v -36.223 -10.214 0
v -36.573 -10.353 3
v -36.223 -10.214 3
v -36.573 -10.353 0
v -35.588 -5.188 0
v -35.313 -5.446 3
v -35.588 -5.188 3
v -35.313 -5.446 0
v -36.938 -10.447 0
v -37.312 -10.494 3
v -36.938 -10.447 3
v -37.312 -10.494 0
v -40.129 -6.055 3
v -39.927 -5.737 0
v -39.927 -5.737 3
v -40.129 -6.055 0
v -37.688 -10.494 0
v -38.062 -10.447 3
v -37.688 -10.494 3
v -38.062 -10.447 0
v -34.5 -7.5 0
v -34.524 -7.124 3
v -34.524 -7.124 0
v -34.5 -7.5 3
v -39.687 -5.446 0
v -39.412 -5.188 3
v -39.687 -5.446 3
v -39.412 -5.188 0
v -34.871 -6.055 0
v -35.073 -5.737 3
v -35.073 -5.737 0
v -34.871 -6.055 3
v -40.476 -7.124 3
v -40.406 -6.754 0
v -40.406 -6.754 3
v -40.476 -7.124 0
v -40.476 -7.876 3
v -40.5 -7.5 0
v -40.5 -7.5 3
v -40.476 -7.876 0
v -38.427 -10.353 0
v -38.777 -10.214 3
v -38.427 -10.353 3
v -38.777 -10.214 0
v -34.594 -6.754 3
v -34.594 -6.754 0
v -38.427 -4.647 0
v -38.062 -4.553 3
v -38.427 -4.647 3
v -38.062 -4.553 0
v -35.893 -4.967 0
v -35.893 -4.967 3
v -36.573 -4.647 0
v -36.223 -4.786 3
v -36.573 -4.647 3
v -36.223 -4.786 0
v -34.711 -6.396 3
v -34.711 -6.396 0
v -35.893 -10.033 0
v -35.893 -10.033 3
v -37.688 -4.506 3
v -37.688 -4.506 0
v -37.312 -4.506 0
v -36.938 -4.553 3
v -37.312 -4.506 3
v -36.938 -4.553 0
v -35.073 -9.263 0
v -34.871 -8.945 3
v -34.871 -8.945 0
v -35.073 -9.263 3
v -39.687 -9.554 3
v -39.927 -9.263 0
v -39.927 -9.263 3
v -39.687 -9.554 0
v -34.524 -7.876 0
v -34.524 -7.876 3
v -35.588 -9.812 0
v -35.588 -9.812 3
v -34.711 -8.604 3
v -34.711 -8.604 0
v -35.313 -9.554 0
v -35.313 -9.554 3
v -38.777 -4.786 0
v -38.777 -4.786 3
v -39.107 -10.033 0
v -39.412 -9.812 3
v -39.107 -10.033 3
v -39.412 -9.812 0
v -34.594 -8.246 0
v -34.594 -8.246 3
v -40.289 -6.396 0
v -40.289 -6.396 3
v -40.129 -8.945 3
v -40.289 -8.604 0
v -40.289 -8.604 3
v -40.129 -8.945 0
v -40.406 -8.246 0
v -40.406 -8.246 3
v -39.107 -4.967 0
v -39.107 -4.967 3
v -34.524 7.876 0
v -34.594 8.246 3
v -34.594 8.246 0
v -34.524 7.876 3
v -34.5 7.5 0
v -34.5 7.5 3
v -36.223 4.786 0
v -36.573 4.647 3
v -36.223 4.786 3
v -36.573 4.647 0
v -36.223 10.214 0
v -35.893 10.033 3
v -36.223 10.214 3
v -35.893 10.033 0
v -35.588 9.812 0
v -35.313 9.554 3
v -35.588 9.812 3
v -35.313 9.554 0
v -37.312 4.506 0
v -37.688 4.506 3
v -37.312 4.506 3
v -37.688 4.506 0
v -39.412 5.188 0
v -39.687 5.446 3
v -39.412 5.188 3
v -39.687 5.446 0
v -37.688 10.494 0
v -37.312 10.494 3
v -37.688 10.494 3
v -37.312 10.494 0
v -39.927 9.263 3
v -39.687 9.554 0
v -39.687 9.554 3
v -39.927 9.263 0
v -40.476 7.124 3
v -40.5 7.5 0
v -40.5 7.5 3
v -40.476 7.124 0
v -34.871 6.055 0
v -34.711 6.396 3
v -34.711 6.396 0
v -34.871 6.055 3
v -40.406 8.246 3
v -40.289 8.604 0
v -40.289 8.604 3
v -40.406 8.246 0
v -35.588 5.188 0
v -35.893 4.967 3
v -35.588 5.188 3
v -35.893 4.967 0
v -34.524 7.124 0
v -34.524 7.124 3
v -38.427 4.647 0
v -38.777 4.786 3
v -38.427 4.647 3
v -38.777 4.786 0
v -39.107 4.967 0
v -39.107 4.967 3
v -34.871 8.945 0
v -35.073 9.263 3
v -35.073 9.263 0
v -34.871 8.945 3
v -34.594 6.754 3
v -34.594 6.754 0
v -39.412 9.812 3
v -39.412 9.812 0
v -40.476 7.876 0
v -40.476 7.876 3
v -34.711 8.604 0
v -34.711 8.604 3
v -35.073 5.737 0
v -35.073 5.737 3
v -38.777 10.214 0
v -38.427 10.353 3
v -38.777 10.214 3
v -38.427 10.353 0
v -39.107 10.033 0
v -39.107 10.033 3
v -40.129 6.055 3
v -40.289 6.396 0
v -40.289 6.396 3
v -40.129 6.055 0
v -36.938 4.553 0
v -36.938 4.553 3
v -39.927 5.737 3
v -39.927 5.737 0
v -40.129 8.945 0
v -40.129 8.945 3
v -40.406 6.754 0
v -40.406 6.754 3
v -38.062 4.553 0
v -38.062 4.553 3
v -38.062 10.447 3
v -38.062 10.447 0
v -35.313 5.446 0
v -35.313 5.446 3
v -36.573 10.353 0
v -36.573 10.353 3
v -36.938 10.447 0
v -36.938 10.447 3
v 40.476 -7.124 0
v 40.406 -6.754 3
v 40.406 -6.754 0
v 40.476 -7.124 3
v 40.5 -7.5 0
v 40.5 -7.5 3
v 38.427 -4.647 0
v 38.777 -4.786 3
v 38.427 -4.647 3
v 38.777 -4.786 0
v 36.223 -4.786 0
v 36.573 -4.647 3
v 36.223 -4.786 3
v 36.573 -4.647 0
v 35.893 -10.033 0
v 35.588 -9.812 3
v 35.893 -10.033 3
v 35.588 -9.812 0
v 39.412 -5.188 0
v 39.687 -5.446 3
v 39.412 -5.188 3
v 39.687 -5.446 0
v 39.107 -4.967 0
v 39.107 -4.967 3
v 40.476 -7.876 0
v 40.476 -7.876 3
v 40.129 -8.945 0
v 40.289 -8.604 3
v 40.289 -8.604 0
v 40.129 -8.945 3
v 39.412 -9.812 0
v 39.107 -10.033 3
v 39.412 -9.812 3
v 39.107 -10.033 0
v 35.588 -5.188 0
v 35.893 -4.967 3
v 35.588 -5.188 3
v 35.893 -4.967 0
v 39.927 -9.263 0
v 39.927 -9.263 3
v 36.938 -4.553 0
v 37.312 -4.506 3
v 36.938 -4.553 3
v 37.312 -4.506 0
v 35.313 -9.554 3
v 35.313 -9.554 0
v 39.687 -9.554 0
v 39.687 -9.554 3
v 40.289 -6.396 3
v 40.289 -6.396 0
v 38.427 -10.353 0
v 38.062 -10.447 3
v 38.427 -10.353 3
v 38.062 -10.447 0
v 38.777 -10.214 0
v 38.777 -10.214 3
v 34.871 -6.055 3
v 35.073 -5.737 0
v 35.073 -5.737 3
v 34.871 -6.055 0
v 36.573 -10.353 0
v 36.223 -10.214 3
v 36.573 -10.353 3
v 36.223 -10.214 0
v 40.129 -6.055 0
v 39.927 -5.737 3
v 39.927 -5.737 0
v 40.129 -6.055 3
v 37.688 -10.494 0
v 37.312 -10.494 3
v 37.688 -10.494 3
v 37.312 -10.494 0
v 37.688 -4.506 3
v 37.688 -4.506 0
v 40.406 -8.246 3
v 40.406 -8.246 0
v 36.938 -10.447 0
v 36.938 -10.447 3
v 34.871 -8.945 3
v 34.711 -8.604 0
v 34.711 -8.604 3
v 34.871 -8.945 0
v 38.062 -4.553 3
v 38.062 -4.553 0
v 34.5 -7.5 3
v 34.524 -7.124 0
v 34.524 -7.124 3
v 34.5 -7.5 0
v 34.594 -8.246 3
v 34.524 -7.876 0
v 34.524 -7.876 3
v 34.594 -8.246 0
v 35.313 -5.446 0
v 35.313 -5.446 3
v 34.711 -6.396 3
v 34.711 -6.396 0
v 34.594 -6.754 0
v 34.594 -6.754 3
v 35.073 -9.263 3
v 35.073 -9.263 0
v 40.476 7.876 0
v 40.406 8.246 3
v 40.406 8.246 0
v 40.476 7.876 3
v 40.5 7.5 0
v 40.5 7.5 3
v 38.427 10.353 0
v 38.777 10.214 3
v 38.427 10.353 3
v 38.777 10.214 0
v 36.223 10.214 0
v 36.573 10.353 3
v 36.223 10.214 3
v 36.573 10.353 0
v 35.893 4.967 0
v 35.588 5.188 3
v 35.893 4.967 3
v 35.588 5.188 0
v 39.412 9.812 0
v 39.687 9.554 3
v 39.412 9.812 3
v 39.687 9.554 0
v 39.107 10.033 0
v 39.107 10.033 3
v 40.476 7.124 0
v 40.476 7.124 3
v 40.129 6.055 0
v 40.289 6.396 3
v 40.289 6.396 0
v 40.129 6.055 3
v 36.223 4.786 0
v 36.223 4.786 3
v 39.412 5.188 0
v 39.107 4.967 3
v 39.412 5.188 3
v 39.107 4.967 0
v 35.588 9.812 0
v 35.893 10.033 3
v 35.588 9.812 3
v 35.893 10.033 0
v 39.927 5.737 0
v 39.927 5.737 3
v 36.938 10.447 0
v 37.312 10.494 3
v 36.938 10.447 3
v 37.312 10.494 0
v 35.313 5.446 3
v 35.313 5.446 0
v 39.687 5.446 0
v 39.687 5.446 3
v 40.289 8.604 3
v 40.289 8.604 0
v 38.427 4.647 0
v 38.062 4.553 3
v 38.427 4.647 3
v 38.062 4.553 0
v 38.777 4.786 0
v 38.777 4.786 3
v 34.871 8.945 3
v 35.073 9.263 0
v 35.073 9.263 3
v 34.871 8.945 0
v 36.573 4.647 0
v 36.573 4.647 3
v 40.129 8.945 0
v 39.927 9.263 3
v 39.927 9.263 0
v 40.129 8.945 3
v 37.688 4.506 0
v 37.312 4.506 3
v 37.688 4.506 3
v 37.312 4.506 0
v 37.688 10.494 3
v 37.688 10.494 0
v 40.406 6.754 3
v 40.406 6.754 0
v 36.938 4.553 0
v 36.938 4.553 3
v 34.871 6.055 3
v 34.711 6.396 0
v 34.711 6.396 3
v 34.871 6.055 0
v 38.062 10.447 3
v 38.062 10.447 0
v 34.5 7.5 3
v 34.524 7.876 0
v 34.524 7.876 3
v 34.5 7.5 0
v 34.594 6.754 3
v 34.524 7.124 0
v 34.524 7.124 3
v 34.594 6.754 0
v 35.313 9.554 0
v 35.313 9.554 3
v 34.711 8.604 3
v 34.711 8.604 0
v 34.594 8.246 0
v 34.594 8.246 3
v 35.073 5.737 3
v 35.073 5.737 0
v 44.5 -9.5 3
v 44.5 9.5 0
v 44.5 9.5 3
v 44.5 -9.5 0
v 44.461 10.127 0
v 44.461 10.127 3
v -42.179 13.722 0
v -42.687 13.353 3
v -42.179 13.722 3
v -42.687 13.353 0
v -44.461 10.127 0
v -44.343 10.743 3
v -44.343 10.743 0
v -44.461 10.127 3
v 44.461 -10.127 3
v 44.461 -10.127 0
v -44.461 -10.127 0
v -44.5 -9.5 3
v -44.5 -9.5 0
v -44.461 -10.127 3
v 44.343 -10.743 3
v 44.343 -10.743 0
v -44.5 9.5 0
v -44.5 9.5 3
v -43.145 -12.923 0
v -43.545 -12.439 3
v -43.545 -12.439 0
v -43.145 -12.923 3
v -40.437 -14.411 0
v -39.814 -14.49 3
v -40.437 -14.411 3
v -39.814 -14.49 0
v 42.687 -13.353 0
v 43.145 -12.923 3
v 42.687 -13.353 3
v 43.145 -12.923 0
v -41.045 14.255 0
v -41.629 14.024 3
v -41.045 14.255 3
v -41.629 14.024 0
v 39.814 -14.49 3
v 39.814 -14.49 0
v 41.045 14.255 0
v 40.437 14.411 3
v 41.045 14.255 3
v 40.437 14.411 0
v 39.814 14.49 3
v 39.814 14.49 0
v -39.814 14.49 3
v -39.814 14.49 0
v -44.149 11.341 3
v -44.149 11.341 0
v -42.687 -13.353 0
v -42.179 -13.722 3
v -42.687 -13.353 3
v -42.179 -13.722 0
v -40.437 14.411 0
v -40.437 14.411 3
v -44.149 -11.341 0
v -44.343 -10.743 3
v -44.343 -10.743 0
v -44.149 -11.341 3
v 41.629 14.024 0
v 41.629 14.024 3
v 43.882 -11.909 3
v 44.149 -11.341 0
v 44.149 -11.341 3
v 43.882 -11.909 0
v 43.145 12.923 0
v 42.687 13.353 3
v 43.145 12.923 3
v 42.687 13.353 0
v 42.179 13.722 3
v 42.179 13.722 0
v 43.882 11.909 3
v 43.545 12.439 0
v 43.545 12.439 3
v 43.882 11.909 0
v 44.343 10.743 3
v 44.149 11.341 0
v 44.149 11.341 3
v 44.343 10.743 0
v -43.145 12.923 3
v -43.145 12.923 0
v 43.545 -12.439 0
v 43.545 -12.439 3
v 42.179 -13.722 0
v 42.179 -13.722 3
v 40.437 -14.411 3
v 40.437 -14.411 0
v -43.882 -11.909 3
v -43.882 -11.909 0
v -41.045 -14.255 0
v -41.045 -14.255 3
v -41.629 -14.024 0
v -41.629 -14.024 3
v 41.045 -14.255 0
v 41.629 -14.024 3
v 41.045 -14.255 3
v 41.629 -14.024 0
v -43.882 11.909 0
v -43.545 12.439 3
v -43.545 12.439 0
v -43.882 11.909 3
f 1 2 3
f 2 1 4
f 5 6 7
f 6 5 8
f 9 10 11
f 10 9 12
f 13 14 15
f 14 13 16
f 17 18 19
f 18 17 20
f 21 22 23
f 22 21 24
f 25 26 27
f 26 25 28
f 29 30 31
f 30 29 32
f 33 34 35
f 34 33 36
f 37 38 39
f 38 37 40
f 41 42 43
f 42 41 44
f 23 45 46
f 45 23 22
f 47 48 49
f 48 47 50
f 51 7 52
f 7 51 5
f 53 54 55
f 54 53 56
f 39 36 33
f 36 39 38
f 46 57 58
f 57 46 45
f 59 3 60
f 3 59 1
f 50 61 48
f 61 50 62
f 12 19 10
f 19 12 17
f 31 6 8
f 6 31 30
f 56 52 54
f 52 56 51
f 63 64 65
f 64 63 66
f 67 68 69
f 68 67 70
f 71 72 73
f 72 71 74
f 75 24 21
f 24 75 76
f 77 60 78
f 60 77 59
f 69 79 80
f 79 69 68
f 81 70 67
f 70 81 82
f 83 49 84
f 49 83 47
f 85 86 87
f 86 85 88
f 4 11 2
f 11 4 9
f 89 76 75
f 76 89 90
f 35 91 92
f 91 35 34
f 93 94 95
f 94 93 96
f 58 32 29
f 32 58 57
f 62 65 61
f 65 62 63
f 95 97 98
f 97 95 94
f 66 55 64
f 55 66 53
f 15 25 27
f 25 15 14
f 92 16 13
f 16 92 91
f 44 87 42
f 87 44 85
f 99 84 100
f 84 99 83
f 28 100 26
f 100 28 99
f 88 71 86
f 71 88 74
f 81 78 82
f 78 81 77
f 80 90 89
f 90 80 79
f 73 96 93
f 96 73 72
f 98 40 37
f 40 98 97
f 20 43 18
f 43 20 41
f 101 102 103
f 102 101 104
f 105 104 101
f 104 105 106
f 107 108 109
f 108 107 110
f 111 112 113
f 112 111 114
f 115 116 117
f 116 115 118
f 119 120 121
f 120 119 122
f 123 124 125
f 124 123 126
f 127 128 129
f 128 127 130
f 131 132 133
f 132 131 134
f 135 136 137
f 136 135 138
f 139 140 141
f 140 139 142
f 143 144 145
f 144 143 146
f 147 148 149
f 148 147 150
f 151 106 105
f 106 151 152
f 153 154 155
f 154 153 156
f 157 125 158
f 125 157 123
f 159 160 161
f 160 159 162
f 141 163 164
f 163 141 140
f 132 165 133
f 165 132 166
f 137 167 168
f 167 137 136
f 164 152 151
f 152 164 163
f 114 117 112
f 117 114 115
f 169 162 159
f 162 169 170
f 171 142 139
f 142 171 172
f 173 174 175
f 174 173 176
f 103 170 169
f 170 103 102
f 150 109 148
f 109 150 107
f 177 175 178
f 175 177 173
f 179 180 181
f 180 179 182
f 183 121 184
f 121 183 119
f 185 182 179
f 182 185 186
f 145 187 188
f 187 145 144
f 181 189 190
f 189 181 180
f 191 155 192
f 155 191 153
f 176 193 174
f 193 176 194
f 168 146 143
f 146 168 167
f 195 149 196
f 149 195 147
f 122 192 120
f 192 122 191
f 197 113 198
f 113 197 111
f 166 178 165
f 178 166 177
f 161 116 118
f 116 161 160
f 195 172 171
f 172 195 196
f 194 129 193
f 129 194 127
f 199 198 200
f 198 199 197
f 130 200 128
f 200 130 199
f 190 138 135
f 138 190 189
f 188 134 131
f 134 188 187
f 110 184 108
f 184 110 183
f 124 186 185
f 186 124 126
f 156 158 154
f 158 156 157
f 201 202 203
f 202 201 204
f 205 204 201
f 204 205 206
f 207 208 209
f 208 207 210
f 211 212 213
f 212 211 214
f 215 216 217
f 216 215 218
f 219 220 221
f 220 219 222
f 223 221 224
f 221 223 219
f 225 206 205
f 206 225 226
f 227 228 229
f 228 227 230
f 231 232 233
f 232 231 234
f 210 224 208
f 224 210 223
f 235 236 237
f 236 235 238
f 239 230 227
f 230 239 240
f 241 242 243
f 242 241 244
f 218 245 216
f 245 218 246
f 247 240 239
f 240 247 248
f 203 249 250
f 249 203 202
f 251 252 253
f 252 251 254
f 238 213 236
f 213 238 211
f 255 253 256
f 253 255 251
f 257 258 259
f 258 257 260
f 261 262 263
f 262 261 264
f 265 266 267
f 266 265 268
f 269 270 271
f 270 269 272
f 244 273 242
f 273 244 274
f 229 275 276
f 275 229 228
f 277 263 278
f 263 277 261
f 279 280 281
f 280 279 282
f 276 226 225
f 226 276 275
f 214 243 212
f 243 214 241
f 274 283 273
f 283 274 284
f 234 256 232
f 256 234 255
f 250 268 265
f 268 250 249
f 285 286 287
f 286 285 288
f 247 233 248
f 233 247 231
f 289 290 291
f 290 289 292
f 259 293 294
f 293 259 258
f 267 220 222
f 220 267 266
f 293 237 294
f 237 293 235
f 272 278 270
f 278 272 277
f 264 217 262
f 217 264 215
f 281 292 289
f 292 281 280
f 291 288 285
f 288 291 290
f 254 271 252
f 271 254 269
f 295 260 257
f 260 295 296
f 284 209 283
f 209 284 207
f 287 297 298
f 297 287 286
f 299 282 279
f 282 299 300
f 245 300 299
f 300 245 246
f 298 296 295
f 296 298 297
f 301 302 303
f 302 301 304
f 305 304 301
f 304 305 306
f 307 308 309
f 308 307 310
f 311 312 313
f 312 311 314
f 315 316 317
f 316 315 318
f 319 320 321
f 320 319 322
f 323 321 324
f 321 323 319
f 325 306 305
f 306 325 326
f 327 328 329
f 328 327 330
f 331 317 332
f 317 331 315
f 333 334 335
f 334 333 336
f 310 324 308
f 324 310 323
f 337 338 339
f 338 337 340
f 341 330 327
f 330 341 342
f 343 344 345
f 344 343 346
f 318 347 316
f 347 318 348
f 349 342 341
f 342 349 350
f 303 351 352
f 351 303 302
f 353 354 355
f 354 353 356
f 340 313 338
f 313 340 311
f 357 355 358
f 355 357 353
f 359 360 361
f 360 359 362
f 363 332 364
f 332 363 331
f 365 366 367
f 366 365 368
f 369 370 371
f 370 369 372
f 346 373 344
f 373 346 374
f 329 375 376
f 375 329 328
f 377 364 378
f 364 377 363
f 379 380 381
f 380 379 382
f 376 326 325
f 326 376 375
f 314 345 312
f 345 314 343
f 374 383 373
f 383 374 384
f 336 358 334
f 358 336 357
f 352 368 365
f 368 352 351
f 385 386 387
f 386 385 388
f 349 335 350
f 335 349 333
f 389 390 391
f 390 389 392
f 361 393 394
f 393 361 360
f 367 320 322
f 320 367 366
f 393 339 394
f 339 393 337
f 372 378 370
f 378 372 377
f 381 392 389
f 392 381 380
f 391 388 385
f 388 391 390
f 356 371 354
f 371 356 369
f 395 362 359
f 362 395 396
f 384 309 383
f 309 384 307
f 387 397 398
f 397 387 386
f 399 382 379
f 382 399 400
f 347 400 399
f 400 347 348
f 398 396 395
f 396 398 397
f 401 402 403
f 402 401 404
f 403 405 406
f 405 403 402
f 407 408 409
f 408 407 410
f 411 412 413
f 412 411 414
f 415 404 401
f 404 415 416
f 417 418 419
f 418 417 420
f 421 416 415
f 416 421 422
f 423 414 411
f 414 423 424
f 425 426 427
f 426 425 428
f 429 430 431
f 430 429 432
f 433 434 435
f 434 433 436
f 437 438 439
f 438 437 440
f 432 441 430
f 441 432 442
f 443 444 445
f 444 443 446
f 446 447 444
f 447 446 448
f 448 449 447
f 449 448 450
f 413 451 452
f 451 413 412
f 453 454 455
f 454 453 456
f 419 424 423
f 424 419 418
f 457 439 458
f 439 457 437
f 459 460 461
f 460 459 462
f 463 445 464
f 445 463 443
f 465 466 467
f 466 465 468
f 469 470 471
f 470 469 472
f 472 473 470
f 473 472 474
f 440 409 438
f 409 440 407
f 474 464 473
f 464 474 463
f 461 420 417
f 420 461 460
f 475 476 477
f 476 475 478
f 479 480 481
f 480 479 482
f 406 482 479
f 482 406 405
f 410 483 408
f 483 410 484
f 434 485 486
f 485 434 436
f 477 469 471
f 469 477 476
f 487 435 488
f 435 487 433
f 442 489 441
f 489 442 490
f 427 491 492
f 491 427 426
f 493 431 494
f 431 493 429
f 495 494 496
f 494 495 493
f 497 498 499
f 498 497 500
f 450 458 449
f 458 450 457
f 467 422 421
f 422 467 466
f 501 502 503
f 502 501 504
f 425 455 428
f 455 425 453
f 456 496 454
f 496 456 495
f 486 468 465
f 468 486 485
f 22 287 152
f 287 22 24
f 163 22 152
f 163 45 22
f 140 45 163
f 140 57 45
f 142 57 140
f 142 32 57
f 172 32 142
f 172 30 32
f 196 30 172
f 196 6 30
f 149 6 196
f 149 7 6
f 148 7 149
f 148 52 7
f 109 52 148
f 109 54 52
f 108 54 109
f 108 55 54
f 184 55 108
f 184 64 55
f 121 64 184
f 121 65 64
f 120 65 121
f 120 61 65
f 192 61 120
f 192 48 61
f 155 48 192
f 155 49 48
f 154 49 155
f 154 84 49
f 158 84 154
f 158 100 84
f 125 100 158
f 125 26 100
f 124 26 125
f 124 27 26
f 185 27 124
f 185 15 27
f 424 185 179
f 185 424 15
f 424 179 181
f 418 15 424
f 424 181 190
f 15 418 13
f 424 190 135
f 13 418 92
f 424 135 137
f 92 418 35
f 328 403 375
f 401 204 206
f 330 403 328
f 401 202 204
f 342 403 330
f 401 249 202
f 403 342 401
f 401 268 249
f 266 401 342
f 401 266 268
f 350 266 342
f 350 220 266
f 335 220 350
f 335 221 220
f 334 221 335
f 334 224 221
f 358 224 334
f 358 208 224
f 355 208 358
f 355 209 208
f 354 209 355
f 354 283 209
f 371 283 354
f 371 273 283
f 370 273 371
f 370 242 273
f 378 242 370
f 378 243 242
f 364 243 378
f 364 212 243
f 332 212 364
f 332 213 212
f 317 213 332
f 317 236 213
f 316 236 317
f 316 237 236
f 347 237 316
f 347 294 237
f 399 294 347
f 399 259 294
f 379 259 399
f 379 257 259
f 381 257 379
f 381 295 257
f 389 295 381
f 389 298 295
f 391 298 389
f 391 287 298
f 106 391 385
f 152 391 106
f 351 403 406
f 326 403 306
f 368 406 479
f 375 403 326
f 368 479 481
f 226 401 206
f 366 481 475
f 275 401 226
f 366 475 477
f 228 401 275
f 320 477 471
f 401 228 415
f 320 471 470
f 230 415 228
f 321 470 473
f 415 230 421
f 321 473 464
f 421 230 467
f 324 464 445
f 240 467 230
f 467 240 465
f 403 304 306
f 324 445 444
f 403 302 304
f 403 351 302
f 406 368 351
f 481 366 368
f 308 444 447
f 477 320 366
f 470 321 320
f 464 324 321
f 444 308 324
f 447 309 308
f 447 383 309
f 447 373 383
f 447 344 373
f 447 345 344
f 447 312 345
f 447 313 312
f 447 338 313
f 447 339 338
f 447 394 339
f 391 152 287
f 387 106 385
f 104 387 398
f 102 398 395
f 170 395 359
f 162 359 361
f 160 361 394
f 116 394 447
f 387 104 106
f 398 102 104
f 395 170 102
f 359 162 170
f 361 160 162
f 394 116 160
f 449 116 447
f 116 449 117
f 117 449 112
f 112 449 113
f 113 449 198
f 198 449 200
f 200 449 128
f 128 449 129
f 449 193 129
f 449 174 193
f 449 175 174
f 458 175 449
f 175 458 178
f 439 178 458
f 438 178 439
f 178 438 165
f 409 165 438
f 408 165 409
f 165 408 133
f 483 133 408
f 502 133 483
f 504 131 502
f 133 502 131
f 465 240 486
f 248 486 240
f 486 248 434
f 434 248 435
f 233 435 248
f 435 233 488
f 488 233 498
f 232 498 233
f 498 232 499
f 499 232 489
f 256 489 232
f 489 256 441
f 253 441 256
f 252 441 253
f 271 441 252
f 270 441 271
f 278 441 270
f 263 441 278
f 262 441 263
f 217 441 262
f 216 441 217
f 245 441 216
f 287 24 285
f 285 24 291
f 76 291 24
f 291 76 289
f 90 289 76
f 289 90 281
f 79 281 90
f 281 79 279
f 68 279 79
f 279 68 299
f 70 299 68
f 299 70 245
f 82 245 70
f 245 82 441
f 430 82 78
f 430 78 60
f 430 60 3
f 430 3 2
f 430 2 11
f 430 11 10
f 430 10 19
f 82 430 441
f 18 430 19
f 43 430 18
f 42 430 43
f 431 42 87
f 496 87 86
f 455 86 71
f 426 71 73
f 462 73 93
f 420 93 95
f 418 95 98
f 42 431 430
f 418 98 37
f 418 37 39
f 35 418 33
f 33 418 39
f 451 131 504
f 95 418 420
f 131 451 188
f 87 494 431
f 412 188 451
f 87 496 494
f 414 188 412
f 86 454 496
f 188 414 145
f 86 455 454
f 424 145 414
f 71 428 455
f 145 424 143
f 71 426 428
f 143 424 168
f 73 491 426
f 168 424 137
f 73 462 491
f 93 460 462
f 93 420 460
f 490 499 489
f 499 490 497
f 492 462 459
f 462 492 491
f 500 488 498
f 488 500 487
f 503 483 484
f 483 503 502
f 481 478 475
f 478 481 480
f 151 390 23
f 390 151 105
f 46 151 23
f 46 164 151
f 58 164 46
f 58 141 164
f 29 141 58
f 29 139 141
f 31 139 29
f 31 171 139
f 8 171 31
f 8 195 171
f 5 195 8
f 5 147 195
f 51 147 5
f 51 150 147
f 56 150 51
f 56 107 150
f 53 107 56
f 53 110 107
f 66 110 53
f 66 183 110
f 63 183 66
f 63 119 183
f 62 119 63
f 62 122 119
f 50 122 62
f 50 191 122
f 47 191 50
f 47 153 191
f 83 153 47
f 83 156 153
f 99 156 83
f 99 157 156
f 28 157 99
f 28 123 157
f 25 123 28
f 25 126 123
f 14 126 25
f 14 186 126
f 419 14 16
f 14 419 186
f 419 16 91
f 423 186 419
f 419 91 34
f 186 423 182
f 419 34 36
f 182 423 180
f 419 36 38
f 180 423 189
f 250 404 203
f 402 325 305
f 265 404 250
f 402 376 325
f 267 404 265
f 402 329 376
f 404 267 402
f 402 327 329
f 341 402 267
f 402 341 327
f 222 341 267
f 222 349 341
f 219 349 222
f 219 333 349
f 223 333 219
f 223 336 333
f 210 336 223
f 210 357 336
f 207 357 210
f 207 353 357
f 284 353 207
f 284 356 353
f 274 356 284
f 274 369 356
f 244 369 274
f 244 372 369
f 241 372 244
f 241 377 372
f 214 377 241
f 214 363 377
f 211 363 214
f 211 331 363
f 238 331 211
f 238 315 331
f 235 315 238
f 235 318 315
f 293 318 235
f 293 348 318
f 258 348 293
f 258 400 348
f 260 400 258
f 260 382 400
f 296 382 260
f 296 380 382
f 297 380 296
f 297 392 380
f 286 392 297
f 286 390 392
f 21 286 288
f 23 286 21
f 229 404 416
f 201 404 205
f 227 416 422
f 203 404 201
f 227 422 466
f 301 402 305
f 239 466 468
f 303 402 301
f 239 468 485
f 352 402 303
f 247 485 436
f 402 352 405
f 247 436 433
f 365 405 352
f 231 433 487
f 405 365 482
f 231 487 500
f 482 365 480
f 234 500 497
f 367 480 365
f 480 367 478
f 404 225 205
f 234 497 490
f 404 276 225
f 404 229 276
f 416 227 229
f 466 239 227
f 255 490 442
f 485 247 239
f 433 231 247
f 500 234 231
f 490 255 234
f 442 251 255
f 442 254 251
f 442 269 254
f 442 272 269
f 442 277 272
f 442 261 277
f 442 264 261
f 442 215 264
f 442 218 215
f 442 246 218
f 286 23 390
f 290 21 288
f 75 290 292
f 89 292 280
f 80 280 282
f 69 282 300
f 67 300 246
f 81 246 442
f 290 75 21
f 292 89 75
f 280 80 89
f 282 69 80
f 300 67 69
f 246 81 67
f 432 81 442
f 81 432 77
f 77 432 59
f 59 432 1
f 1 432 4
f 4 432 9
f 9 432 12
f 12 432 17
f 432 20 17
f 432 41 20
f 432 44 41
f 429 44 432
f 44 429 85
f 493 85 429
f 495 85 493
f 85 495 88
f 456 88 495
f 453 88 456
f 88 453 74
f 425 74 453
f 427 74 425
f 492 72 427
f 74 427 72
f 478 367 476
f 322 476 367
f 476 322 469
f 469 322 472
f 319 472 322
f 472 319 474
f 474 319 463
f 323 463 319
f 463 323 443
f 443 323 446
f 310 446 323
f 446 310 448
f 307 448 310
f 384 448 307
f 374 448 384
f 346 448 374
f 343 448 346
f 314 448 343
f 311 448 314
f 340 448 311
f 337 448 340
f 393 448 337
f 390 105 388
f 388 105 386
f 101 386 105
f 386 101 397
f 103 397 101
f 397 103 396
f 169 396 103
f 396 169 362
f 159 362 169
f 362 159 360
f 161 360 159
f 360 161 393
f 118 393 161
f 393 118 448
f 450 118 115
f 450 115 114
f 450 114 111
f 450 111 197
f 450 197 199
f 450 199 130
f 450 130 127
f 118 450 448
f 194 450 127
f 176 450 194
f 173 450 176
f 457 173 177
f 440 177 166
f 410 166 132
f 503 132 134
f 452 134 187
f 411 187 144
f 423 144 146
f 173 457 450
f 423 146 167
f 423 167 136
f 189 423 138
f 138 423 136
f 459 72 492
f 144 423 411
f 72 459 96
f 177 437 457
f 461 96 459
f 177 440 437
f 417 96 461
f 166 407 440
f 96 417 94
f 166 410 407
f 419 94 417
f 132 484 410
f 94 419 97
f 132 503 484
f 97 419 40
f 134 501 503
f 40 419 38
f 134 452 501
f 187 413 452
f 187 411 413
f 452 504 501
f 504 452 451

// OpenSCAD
$fn = 50;


difference() {
	union() {
		hull() {
			translate(v = [-39.5000000000, 9.5000000000, 0]) {
				cylinder(h = 3, r = 5);
			}
			translate(v = [39.5000000000, 9.5000000000, 0]) {
				cylinder(h = 3, r = 5);
			}
			translate(v = [-39.5000000000, -9.5000000000, 0]) {
				cylinder(h = 3, r = 5);
			}
			translate(v = [39.5000000000, -9.5000000000, 0]) {
				cylinder(h = 3, r = 5);
			}
		}
	}
	union() {
		translate(v = [-37.5000000000, -7.5000000000, -100.0000000000]) {
			cylinder(h = 200, r = 3.0000000000);
		}
		translate(v = [-37.5000000000, 7.5000000000, -100.0000000000]) {
			cylinder(h = 200, r = 3.0000000000);
		}
		translate(v = [37.5000000000, -7.5000000000, -100.0000000000]) {
			cylinder(h = 200, r = 3.0000000000);
		}
		translate(v = [37.5000000000, 7.5000000000, -100.0000000000]) {
			cylinder(h = 200, r = 3.0000000000);
		}
	}
}
